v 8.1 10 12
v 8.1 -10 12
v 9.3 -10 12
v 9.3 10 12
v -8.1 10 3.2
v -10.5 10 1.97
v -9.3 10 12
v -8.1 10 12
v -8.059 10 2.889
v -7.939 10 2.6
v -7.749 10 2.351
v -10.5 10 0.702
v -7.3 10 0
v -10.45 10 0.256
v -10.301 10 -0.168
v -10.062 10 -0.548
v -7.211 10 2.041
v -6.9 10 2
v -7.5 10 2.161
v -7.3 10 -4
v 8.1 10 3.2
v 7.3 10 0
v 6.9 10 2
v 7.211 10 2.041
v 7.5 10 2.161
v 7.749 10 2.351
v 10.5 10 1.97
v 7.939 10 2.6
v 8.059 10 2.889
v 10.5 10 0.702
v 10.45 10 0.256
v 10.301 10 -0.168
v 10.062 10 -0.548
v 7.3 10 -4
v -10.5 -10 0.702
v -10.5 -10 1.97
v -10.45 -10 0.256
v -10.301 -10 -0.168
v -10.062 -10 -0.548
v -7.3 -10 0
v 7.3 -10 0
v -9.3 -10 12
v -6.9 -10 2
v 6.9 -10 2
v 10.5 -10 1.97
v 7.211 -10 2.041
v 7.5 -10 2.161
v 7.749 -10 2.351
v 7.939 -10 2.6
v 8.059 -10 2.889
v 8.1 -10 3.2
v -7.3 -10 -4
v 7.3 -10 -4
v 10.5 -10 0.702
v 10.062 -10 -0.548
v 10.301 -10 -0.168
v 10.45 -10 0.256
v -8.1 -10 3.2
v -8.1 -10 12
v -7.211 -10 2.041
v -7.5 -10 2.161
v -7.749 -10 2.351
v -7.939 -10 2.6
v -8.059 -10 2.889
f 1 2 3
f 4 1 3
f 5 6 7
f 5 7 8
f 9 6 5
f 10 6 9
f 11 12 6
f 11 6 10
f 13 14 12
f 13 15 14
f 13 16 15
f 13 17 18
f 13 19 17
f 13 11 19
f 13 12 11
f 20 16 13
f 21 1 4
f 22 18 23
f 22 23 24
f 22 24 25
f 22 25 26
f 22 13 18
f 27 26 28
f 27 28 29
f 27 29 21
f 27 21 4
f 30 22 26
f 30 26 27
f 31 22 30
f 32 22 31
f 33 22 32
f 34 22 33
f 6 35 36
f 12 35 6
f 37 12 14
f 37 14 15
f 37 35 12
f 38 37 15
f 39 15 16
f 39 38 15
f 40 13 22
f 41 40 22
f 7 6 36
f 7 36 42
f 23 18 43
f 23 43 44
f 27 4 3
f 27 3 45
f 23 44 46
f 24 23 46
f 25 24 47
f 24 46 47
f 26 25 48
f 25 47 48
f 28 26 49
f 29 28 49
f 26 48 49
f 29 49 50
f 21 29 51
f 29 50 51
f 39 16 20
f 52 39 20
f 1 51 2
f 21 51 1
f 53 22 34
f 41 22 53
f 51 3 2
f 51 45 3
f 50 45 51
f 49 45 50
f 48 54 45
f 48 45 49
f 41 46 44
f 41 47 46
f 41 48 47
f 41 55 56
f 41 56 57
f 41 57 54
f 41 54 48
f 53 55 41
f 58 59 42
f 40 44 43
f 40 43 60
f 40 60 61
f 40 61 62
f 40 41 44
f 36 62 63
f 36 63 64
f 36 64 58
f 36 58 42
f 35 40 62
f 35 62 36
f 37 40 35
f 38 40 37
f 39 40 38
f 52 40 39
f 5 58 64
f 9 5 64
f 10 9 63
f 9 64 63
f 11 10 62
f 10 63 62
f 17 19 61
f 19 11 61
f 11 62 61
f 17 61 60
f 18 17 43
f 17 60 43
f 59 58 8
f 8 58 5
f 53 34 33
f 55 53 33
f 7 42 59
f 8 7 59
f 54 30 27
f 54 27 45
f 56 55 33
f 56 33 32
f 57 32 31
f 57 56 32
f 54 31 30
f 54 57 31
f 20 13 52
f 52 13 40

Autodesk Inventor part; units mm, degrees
ref_plane "YZ Plane" through (0, 0, 0) normal (1, 0, 0) x (0, 1, 0)
ref_plane "XZ Plane" through (0, 0, 0) normal (0, 1, 0) x (-1, 0, 0)
ref_plane "XY Plane" through (0, 0, 0) normal (0, 0, 1) x (1, 0, 0)
sketch "Schizzo1" plane through (0, 0, 0) normal (0, 0, 1) x (1, 0, 0)
  line L0 (-10.5, 10) -> (10.5, 10)
  line L1 (10.5, 10) -> (10.5, -10)
  line L2 (10.5, -10) -> (-10.5, -10)
  line L3 (-10.5, -10) -> (-10.5, 10)
  line L4 (-10.5, 10) -> (10.5, -10) construction
  line L5 (10.5, 10) -> (-10.5, -10) construction
  line L6 (-7.3, 10) -> (-7.3, -10)
  line L7 (7.3, 10) -> (7.3, -10)
  line L8 (8.1, -10) -> (8.1, 10)
  line L9 (-8.1, -10) -> (-8.1, 10)
  point P0 (0, 0)
  point P1 (0, 0)
  dimension "d0" = 21
  dimension "d1" = 20
  dimension "d2" = 3.2
  dimension "d3" = 3.2
  dimension "d17" = 2.4
  dimension "d19" = 2.4
extrude "Estrusione4" add sketch "Schizzo1" along normal blind 2
extrude "Estrusione5" add sketch "Schizzo1" against normal blind 4 contours L0 L9 L2 L3 | L0 L6 L2 L9 | L0 L8 L2 L7 | L0 L1 L2 L8
extrude "Estrusione6" add sketch "Schizzo1" along normal blind 12 contours L0 L9 L2 L3 | L0 L1 L2 L8
fillet "Raccordo1" radius 1.2 2 edges at (8.1, 0, 2) (-8.1, 0, 2)
sketch "Schizzo3" plane through (-7.3, 10, 0) normal (0, 1, 0) x (1, 0, 0)
  line L0 (-3.2, 4) -> (-3.2, -12) projected
  line L1 (0, 4) -> (-3.2, 4) projected
  line L2 (-3.2, 0) -> (0, 4)
  line L3 (0, 4) -> (0, 0)
  line L4 (0, 0) -> (-3.2, 0)
  line L5 (14.6, 4) -> (17.8, 4) projected
  line L6 (14.6, 4) -> (17.8, 0)
  line L7 (17.8, 4) -> (17.8, -12) projected
  line L8 (14.6, 0) -> (14.6, 4)
  line L9 (14.6, 0) -> (17.8, 0)
  line L10 (-3.2, 0) -> (-3.2, 4)
  line L11 (0, 4) -> (-3.2, 4)
  line L12 (14.6, 4) -> (17.8, 4)
  line L13 (17.8, 0) -> (17.8, 4)
  point P0 (7.3, 0)
extrude "Estrusione7" cut sketch "Schizzo3" against normal blind 100 contours L1 L2 L0 | L5 L7 L6
fillet "Raccordo2" radius 2 2 edges at (-10.5, 0, 0) (10.5, 0, 0)
sketch "Schizzo4" plane through (-7.3, 10, 0) normal (0, 1, 0) x (1, 0, 0)
  line L0 (-3.2, -0.7016) -> (-3.2, -12) projected
  line L1 (-3.2, -1.9701) -> (-2, -12)
  line L2 (-0.8, -12) -> (-3.2, -12) projected
  line L3 (-2, -12) -> (-3.2, -12)
  line L4 (-3.2, -1.9701) -> (-3.2, -12)
  point P0 (7.3, 0)
extrude "Estrusione8" cut sketch "Schizzo4" against normal blind 100
mirror "Specchio1" about plane through (0, 0, 0) normal (1, 0, 0) of "Estrusione8"
properties part number "Sensore prossimale"
